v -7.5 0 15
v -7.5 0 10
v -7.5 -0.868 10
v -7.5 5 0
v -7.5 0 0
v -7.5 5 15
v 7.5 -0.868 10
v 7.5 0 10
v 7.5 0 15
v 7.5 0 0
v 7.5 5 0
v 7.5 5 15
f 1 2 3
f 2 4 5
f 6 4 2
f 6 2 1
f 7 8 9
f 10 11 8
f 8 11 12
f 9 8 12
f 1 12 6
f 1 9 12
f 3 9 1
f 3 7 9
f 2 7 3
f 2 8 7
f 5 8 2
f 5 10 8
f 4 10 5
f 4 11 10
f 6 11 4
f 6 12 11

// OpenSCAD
module latch( base_width=5, latch_width=15, base_height=10, latch_height=5, latch_angle=10)
{
    //here we draw 2d latch using parameters
    dots = [
        // first dot is zero
        [0,0],
        // then we go forward on x axis 
        // for the base width
        [base_width,0],
        // Up to the upper corner
        // from opposite corner of latch
        [base_width, base_height+latch_height],
        
        //to the angle of the latch
        [0, base_height+latch_height],
    
        //and to to the latch corner dot
        //simplest ever trigonomtry is used here
        //width of the latch itself is it's
        //height times sin(it's angle in degrees)
        [ -latch_height*sin(latch_angle),base_height ],
        // corner
        [ 0,base_height]
    ];
    //extrude it to desired latch width
    translate([-latch_width/2,0,0])
    rotate([90,0,90])
    linear_extrude(latch_width)
        polygon(dots);
}

latch();
